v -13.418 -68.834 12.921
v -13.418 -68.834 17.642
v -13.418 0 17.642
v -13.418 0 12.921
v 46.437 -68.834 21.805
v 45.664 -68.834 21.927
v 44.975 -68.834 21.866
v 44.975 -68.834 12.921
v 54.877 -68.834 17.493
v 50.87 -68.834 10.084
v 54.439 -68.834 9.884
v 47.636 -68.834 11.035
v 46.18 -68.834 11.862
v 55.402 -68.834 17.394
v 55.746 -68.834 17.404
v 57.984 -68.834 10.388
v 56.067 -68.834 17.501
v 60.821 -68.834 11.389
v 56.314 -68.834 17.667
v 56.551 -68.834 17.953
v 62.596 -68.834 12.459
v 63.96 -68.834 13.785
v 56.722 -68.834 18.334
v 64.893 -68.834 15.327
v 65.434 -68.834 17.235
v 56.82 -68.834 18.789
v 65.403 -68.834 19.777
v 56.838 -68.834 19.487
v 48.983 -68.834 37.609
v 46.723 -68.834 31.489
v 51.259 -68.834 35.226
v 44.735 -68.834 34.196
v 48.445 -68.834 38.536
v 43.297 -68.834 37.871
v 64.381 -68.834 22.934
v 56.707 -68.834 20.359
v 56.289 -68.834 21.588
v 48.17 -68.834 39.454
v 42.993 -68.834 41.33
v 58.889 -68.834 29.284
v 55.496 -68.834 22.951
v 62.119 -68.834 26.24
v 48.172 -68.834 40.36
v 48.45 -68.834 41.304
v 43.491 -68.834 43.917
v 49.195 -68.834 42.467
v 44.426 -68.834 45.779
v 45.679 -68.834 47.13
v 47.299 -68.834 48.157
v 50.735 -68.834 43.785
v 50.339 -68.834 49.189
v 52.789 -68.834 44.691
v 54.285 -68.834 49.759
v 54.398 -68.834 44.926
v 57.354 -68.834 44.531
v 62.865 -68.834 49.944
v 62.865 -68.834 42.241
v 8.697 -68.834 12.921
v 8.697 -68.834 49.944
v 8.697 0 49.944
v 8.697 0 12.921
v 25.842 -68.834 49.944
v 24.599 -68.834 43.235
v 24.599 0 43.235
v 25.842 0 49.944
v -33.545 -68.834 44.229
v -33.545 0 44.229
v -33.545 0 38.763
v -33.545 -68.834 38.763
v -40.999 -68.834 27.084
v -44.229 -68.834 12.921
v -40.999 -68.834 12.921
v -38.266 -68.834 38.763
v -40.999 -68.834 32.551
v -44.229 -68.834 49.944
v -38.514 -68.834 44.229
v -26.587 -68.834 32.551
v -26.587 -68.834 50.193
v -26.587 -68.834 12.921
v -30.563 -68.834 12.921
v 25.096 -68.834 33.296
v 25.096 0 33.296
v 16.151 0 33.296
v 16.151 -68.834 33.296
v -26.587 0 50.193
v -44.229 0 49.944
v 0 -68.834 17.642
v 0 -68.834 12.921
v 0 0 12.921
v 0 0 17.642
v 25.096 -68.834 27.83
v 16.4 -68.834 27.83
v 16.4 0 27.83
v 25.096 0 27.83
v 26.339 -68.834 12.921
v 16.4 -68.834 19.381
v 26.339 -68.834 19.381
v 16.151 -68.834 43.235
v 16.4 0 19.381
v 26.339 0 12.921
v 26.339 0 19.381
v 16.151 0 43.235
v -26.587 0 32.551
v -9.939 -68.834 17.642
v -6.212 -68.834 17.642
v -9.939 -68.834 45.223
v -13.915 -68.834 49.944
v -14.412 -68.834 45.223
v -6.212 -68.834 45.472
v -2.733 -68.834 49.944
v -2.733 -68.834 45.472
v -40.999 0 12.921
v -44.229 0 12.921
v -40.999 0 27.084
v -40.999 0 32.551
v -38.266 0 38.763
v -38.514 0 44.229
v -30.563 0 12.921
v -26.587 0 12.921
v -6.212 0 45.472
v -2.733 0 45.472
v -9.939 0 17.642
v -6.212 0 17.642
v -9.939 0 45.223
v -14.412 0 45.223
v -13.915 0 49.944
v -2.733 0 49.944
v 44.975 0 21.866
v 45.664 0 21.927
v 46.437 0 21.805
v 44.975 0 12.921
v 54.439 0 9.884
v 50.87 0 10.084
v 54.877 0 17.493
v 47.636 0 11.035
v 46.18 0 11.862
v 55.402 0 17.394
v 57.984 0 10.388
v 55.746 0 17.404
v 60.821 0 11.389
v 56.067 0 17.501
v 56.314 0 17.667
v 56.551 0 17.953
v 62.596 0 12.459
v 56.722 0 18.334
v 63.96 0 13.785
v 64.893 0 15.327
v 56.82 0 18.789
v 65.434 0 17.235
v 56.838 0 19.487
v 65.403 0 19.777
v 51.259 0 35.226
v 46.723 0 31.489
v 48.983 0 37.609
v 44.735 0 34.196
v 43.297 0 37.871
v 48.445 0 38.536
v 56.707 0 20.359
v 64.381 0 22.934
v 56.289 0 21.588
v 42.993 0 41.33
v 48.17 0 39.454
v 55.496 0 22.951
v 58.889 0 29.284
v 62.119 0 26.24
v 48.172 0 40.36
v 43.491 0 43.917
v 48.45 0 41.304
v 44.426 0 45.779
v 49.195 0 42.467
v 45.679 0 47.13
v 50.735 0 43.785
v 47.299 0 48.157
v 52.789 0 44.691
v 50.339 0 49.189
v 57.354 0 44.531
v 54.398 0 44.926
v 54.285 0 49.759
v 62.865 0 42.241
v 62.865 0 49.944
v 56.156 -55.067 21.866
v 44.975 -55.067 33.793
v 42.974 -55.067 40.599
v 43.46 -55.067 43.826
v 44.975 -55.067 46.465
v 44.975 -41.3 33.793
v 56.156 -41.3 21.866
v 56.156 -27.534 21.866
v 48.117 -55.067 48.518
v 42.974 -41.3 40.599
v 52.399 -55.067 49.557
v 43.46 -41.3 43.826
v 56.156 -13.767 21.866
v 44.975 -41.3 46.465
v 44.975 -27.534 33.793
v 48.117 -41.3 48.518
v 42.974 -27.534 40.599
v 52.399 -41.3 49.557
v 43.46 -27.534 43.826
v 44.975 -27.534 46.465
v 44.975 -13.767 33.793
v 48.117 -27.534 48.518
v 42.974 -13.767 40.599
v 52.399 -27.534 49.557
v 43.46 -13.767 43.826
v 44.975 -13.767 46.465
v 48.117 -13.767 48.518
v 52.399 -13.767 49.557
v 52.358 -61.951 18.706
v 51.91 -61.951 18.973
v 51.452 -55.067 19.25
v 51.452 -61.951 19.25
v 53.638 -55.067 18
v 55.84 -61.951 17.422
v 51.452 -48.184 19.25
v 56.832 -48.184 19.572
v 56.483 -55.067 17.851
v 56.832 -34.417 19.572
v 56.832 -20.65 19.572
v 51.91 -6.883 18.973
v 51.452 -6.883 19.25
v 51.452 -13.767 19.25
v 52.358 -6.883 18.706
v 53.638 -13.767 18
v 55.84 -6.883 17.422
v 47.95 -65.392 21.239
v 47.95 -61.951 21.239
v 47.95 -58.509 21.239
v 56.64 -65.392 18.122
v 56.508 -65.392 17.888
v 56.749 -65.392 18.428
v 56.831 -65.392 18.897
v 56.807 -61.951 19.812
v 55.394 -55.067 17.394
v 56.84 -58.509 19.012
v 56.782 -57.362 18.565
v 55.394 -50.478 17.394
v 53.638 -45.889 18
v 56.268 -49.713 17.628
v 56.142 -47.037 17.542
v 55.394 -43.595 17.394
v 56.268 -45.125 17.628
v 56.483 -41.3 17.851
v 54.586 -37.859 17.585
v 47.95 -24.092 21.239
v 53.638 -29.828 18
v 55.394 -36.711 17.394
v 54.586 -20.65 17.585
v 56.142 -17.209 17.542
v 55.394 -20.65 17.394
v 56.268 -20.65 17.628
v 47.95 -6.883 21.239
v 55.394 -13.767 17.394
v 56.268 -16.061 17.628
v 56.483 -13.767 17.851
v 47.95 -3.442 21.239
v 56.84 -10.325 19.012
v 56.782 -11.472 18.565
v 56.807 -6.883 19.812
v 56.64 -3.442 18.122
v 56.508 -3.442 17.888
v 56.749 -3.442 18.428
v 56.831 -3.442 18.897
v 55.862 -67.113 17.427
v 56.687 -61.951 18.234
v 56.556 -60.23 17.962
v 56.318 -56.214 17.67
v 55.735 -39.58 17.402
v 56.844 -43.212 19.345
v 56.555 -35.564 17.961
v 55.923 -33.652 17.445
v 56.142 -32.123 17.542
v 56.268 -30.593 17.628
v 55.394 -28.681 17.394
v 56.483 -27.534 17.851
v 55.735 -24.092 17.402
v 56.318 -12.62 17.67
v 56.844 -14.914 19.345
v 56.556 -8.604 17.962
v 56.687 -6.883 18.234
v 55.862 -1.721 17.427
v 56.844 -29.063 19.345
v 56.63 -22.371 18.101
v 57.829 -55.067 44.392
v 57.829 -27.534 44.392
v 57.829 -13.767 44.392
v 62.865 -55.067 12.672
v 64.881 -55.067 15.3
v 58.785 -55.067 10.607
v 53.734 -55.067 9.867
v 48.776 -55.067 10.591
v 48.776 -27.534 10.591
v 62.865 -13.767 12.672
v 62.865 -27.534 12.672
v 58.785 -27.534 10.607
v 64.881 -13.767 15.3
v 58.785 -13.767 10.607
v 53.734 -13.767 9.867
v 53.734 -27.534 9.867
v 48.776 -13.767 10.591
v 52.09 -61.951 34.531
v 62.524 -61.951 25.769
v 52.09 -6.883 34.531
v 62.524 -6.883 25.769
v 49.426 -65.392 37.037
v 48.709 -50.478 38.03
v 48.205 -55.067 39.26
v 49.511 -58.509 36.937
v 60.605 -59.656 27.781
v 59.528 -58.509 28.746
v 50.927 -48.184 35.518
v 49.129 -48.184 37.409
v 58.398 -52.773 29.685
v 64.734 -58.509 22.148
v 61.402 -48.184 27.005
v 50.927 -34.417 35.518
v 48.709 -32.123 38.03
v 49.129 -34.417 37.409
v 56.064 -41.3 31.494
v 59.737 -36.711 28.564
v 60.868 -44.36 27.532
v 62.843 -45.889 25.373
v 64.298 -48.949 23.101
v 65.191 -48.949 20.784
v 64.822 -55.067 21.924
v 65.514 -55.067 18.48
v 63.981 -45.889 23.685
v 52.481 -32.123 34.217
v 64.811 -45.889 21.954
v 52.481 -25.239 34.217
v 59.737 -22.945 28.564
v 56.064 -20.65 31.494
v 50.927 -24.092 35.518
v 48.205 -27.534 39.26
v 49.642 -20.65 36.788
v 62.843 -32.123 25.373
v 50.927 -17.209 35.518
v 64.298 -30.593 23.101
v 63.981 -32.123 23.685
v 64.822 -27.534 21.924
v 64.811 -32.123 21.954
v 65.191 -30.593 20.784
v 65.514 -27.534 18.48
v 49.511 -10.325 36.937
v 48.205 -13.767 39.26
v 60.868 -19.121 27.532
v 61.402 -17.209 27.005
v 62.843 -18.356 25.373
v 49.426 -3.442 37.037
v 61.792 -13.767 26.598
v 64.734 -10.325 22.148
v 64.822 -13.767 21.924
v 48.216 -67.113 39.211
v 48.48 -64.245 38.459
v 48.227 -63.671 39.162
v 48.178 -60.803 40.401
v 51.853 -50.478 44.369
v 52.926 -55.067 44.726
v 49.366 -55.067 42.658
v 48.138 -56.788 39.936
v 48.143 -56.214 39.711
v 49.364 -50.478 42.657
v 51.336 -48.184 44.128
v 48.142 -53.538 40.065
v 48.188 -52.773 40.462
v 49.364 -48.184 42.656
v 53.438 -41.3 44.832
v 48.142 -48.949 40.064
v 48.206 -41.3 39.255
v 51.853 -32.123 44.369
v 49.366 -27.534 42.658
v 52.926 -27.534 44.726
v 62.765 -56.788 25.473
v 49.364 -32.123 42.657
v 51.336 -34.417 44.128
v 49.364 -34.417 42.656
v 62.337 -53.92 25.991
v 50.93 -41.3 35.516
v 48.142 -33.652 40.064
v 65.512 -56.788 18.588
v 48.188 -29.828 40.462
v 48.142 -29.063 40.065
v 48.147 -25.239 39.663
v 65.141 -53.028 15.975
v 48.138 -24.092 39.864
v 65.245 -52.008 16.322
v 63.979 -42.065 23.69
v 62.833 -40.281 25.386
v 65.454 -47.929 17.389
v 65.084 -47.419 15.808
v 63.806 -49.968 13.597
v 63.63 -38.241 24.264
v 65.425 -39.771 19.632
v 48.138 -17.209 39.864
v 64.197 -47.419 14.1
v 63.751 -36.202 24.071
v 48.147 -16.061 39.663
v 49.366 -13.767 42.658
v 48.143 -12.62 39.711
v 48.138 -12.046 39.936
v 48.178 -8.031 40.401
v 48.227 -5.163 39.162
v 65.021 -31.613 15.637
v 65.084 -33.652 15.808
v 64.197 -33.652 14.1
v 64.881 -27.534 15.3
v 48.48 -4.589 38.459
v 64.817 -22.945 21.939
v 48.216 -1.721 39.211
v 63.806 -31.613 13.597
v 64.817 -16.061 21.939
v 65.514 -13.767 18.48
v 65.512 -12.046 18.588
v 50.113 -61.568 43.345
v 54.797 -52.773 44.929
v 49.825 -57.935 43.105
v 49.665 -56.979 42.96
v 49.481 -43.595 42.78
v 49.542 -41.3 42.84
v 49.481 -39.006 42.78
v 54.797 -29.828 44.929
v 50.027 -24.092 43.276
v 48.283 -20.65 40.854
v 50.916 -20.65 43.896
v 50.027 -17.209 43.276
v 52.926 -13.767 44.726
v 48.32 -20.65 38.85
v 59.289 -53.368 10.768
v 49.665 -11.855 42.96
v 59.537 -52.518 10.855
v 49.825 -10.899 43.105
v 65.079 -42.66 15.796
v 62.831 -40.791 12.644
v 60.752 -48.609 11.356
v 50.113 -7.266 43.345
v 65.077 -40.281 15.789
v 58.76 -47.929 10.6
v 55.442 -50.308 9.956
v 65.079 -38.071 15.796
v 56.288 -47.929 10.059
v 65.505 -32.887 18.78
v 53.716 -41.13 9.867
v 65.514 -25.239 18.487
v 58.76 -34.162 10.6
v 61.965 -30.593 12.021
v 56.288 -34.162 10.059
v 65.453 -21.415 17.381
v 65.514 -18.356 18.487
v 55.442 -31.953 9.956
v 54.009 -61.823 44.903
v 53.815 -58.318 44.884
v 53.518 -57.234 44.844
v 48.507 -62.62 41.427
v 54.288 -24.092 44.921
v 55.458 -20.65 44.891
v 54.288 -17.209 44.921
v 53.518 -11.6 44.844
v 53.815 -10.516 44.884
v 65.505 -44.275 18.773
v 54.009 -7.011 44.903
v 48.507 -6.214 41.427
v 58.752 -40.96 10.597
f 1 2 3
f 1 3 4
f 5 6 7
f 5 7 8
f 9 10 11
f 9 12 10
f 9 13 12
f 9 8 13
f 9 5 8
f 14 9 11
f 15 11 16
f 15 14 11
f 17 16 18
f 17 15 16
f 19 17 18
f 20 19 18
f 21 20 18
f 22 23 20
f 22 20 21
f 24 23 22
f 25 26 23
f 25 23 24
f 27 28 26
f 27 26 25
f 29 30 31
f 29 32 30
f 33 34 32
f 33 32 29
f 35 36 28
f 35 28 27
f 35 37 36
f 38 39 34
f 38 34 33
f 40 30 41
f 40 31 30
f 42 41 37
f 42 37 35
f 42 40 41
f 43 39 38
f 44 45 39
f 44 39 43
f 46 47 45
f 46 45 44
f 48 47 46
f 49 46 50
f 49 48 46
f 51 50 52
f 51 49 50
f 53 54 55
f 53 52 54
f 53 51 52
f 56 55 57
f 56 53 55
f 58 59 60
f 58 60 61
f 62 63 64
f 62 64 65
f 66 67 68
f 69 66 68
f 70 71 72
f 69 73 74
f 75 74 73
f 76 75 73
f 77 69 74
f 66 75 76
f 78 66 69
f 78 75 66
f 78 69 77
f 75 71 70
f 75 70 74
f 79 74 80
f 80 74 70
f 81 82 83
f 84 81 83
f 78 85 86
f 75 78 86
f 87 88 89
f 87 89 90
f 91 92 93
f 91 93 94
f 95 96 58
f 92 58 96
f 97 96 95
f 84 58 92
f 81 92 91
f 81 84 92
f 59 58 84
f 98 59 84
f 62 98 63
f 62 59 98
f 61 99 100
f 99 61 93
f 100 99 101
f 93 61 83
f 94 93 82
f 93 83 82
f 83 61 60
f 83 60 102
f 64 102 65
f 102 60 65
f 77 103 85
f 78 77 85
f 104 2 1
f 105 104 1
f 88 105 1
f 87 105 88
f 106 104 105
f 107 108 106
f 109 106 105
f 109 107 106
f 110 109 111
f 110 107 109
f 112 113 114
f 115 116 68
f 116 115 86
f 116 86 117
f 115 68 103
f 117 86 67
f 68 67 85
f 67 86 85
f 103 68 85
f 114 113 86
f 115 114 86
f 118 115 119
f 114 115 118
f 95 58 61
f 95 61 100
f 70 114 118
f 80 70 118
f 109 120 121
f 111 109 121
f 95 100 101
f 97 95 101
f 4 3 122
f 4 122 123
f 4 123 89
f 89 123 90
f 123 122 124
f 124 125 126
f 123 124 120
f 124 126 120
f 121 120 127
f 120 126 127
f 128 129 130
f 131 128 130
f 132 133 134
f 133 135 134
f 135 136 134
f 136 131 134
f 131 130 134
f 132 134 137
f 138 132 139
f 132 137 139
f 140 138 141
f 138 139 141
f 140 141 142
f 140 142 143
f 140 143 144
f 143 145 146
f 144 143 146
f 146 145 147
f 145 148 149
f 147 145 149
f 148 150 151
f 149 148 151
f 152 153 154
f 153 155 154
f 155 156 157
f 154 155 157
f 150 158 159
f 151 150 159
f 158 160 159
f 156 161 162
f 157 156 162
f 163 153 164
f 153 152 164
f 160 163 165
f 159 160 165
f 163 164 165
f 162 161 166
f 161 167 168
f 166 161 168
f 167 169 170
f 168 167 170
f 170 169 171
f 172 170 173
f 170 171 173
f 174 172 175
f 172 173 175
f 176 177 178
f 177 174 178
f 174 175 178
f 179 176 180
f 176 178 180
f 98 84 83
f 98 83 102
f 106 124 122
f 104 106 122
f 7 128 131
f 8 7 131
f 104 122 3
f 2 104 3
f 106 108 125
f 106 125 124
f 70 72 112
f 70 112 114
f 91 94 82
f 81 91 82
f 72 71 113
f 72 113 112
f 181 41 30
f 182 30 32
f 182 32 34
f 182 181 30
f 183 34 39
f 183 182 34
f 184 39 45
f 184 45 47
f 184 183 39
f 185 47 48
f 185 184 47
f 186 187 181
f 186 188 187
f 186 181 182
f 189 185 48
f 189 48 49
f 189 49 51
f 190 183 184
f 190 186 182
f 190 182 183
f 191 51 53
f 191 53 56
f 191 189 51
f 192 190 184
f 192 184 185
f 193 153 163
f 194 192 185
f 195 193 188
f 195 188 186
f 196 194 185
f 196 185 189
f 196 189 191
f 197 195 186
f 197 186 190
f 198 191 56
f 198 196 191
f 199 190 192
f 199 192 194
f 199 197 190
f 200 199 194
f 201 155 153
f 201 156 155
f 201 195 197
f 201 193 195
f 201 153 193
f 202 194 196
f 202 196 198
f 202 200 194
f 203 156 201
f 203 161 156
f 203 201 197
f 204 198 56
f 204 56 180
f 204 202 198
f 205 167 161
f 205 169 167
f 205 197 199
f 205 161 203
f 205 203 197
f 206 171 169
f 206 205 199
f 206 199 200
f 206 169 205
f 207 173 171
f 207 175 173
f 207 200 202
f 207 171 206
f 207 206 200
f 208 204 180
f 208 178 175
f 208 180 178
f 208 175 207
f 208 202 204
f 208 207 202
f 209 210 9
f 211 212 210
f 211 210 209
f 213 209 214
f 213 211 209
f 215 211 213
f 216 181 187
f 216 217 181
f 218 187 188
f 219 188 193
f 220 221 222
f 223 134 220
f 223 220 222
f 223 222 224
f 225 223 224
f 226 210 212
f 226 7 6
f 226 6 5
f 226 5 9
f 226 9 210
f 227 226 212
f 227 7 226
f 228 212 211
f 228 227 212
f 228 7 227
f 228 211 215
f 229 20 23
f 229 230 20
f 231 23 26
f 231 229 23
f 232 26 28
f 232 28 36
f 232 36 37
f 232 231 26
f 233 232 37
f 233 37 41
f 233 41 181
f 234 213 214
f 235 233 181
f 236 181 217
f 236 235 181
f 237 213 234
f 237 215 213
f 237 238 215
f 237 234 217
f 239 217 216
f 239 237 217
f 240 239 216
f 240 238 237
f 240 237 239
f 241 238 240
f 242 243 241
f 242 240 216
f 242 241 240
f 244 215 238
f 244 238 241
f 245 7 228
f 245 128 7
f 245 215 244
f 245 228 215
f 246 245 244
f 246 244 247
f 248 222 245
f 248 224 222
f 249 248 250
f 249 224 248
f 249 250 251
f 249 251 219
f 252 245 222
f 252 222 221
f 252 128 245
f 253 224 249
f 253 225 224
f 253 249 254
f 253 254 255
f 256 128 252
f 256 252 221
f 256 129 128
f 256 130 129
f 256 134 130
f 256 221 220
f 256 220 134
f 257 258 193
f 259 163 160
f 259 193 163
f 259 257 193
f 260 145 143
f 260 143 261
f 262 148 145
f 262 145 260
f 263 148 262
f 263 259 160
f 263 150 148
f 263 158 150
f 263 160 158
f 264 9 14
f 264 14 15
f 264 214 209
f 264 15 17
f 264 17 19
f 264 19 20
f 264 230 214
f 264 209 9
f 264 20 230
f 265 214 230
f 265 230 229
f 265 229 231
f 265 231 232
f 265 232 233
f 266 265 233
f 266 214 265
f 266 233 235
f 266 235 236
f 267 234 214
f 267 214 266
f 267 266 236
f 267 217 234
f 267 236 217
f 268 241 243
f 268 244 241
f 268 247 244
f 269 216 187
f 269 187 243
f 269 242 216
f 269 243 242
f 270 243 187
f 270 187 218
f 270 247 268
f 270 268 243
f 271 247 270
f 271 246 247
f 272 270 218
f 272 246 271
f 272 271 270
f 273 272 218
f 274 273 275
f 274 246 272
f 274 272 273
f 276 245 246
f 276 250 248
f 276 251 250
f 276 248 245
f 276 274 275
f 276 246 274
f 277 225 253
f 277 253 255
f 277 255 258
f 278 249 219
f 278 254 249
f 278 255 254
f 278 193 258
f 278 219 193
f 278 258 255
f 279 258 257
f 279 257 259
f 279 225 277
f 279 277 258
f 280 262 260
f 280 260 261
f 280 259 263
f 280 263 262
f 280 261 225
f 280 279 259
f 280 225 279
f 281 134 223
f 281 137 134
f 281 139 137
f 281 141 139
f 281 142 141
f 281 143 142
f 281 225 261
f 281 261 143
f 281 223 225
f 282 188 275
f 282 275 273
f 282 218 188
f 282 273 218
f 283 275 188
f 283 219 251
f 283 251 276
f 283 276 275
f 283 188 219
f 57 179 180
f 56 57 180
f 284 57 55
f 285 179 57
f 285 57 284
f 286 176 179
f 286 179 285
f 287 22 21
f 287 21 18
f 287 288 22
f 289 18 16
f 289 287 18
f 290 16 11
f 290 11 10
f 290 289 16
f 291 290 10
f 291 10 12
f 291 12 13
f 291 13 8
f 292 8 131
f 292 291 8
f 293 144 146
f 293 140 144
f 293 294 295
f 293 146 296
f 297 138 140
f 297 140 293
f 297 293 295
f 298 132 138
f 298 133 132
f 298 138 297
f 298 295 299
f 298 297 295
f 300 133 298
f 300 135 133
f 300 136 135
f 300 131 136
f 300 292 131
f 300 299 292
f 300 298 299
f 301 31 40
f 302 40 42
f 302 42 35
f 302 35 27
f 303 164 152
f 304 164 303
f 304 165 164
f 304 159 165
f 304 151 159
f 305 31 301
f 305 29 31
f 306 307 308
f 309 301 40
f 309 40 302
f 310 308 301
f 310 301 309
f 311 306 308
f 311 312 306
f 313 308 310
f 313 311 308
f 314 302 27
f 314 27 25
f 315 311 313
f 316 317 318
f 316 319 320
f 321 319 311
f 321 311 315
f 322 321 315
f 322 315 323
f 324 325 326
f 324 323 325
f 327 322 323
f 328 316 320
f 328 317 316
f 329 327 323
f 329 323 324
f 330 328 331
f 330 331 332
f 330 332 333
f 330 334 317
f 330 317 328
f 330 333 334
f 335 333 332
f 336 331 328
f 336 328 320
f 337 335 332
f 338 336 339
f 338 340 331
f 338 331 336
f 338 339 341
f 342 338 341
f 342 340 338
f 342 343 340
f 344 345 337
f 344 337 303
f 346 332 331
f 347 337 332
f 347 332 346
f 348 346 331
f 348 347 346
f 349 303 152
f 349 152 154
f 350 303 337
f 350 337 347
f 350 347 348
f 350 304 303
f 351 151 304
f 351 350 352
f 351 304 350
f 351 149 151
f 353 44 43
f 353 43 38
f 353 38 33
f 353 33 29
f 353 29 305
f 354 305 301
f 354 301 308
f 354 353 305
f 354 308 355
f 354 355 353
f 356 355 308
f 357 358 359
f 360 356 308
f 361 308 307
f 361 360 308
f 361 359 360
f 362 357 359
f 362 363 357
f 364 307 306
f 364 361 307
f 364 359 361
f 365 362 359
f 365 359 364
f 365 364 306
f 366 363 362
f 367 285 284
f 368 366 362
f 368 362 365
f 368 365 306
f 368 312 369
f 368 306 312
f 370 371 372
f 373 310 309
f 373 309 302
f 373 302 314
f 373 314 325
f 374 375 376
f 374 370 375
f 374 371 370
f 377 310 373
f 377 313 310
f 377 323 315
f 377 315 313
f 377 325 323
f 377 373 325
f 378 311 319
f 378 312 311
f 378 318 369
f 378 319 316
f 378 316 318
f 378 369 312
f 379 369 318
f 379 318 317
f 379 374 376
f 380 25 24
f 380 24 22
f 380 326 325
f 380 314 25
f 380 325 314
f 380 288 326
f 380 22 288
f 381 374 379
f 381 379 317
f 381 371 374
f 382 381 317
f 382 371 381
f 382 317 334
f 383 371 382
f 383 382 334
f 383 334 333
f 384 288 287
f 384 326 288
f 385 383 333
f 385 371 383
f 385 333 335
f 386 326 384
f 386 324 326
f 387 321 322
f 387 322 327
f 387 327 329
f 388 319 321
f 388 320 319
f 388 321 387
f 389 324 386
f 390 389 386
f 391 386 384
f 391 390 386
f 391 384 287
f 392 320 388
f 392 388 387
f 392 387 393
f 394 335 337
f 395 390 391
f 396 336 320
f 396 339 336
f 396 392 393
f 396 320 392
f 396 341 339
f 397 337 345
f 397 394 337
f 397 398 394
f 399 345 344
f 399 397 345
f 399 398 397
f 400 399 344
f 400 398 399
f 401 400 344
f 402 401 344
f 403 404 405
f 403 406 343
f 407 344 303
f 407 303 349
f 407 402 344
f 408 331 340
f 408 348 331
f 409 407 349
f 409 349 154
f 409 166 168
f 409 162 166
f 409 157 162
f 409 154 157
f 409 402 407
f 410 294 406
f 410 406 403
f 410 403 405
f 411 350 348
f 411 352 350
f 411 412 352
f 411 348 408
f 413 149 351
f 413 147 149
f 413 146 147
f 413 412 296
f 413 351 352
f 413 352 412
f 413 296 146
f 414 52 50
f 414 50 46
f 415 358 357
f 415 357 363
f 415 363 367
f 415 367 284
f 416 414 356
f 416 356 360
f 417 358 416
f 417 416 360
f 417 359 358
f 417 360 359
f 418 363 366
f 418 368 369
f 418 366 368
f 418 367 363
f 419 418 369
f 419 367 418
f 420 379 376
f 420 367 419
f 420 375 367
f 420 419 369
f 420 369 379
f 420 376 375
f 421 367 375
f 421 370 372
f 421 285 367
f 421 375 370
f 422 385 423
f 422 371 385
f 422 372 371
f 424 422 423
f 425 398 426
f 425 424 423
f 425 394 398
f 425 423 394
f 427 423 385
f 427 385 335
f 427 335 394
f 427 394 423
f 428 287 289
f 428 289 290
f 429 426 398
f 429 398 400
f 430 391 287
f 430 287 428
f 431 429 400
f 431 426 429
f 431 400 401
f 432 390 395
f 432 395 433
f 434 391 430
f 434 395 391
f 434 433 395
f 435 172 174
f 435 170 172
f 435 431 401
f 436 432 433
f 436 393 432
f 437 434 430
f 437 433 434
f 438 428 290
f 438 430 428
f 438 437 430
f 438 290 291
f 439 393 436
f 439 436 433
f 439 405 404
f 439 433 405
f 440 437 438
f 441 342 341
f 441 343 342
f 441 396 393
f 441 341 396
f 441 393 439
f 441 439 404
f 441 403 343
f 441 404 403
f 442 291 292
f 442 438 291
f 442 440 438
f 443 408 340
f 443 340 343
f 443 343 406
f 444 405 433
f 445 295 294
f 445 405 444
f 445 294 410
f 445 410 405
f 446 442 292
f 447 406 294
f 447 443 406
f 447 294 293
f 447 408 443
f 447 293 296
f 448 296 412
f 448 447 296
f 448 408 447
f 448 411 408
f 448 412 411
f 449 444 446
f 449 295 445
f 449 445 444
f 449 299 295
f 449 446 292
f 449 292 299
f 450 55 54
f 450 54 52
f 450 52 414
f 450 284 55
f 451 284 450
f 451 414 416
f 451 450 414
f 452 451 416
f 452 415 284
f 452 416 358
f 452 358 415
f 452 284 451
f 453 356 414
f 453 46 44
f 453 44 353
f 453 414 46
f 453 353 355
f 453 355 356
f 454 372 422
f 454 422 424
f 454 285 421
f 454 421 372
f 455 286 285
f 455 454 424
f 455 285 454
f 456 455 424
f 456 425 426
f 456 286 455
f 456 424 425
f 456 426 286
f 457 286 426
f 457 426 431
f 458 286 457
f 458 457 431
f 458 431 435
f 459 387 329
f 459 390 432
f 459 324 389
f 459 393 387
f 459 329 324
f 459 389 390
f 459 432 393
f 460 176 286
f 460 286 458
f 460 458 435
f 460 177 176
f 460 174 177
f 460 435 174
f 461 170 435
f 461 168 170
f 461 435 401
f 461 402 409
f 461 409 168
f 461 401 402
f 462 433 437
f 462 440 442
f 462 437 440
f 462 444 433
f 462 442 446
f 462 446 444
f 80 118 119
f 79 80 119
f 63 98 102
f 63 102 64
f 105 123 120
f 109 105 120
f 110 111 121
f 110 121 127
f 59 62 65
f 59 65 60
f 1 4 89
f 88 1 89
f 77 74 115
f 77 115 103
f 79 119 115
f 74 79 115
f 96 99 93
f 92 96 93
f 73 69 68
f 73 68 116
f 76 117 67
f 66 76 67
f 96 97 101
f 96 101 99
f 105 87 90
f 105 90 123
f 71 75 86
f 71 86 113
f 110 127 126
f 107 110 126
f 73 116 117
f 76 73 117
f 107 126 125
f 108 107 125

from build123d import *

# Parameters (mm, degrees)
F1_DEPTH = 68.834


with BuildPart() as f1:
    # F0 (on Front) → F1 (new body)
    with BuildSketch(Plane.XZ):
        Polygon((-26.5871733427, 50.1926094294), (-44.229131192, 49.9441288412), (-44.229131192, 12.9208695143), (-40.9989133477, 12.9208695143), (-40.9989133477, 27.0841307938), (-30.5628273636, 12.9208695143), (-26.5871733427, 12.9208695143), (-40.9989133477, 32.5506515801), (-26.5871733427, 32.5506515801), align=None)
        Polygon((-38.2656529546, 38.7626066804), (-38.5141298175, 44.229131192), (-33.5445664823, 44.229131192), (-33.5445664823, 38.7626066804), align=None, mode=Mode.SUBTRACT)
    extrude(amount=F1_DEPTH)


with BuildPart() as f1b:
    # F0 (on Front) → F1, piece 2 (new body)
    with BuildSketch(Plane.XZ):
        Polygon((-2.7332613245, 49.9441288412), (-13.9147825539, 49.9441288412), (-14.4117390737, 45.2230423689), (-9.9391303957, 45.2230423689), (-9.9391303957, 17.6419559866), (-13.4178260341, 17.6419559866), (-13.4178260341, 12.9208695143), (0, 12.9208695143), (0, 17.6419559866), (-6.2119569629, 17.6419559866), (-6.2119569629, 45.4715192318), (-2.7332613245, 45.4715192318), align=None)
    extrude(amount=F1_DEPTH)


with BuildPart() as f1c:
    # F0 (on Front) → F1, piece 3 (new body)
    with BuildSketch(Plane.XZ):
        Polygon((24.5993472636, 43.2352162898), (25.8417408913, 49.9441288412), (8.6967404932, 49.9441288412), (8.6967404932, 12.9208695143), (26.3386946172, 12.9208695143), (26.3386946172, 19.3813033402), (16.3995642215, 19.3813033402), (16.3995642215, 27.8295669705), (25.0963065773, 27.8295669705), (25.0963065773, 33.2960896194), (16.1510854959, 33.2960896194), (16.1510854959, 43.2352162898), align=None)
    extrude(amount=F1_DEPTH)


with BuildPart() as f1d:
    # F0 (on Front) → F1, piece 4 (new body)
    with BuildSketch(Plane.XZ):
        with BuildLine():
            Line((62.8650039434, 42.2413013875), (62.8650039434, 49.9441288412))
            add(Edge.make_bspline(
                [(44.9745617807, 21.8660868704), (47.7595126212, 22.576579189), (56.8852581861, 13.8517422038), (57.429882099, 24.1445943607), (42.4718824727, 31.7959794236), (42.1349283137, 50.0632854785), (55.5498480038, 49.9861764149), (62.8650039434, 49.9441288412)],
                knots=[0.5488532286, 0.5488532286, 0.5488532286, 0.5488532286, 0.637110767, 0.6921224951, 0.7969761942, 0.8892911152, 1, 1, 1, 1], degree=3))
            Line((44.9745617807, 21.8660868704), (44.9745617807, 12.9208695143))
            add(Edge.make_bspline(
                [(62.8650039434, 42.2413013875), (59.4925143477, 43.8773539321), (53.2882913115, 46.8871289358), (43.411403042, 37.7314550219), (66.0307612196, 27.5516009199), (66.7473192465, 9.4474886008), (48.7988357113, 8.682264401), (44.9745617807, 12.9208695143)],
                knots=[0, 0, 0, 0, 0.0830040397, 0.1526989367, 0.269286471, 0.3616013953, 0.47129318, 0.47129318, 0.47129318, 0.47129318], degree=3))
        make_face()
    extrude(amount=F1_DEPTH)


solid = Compound([f1.part, f1b.part, f1c.part, f1d.part])
